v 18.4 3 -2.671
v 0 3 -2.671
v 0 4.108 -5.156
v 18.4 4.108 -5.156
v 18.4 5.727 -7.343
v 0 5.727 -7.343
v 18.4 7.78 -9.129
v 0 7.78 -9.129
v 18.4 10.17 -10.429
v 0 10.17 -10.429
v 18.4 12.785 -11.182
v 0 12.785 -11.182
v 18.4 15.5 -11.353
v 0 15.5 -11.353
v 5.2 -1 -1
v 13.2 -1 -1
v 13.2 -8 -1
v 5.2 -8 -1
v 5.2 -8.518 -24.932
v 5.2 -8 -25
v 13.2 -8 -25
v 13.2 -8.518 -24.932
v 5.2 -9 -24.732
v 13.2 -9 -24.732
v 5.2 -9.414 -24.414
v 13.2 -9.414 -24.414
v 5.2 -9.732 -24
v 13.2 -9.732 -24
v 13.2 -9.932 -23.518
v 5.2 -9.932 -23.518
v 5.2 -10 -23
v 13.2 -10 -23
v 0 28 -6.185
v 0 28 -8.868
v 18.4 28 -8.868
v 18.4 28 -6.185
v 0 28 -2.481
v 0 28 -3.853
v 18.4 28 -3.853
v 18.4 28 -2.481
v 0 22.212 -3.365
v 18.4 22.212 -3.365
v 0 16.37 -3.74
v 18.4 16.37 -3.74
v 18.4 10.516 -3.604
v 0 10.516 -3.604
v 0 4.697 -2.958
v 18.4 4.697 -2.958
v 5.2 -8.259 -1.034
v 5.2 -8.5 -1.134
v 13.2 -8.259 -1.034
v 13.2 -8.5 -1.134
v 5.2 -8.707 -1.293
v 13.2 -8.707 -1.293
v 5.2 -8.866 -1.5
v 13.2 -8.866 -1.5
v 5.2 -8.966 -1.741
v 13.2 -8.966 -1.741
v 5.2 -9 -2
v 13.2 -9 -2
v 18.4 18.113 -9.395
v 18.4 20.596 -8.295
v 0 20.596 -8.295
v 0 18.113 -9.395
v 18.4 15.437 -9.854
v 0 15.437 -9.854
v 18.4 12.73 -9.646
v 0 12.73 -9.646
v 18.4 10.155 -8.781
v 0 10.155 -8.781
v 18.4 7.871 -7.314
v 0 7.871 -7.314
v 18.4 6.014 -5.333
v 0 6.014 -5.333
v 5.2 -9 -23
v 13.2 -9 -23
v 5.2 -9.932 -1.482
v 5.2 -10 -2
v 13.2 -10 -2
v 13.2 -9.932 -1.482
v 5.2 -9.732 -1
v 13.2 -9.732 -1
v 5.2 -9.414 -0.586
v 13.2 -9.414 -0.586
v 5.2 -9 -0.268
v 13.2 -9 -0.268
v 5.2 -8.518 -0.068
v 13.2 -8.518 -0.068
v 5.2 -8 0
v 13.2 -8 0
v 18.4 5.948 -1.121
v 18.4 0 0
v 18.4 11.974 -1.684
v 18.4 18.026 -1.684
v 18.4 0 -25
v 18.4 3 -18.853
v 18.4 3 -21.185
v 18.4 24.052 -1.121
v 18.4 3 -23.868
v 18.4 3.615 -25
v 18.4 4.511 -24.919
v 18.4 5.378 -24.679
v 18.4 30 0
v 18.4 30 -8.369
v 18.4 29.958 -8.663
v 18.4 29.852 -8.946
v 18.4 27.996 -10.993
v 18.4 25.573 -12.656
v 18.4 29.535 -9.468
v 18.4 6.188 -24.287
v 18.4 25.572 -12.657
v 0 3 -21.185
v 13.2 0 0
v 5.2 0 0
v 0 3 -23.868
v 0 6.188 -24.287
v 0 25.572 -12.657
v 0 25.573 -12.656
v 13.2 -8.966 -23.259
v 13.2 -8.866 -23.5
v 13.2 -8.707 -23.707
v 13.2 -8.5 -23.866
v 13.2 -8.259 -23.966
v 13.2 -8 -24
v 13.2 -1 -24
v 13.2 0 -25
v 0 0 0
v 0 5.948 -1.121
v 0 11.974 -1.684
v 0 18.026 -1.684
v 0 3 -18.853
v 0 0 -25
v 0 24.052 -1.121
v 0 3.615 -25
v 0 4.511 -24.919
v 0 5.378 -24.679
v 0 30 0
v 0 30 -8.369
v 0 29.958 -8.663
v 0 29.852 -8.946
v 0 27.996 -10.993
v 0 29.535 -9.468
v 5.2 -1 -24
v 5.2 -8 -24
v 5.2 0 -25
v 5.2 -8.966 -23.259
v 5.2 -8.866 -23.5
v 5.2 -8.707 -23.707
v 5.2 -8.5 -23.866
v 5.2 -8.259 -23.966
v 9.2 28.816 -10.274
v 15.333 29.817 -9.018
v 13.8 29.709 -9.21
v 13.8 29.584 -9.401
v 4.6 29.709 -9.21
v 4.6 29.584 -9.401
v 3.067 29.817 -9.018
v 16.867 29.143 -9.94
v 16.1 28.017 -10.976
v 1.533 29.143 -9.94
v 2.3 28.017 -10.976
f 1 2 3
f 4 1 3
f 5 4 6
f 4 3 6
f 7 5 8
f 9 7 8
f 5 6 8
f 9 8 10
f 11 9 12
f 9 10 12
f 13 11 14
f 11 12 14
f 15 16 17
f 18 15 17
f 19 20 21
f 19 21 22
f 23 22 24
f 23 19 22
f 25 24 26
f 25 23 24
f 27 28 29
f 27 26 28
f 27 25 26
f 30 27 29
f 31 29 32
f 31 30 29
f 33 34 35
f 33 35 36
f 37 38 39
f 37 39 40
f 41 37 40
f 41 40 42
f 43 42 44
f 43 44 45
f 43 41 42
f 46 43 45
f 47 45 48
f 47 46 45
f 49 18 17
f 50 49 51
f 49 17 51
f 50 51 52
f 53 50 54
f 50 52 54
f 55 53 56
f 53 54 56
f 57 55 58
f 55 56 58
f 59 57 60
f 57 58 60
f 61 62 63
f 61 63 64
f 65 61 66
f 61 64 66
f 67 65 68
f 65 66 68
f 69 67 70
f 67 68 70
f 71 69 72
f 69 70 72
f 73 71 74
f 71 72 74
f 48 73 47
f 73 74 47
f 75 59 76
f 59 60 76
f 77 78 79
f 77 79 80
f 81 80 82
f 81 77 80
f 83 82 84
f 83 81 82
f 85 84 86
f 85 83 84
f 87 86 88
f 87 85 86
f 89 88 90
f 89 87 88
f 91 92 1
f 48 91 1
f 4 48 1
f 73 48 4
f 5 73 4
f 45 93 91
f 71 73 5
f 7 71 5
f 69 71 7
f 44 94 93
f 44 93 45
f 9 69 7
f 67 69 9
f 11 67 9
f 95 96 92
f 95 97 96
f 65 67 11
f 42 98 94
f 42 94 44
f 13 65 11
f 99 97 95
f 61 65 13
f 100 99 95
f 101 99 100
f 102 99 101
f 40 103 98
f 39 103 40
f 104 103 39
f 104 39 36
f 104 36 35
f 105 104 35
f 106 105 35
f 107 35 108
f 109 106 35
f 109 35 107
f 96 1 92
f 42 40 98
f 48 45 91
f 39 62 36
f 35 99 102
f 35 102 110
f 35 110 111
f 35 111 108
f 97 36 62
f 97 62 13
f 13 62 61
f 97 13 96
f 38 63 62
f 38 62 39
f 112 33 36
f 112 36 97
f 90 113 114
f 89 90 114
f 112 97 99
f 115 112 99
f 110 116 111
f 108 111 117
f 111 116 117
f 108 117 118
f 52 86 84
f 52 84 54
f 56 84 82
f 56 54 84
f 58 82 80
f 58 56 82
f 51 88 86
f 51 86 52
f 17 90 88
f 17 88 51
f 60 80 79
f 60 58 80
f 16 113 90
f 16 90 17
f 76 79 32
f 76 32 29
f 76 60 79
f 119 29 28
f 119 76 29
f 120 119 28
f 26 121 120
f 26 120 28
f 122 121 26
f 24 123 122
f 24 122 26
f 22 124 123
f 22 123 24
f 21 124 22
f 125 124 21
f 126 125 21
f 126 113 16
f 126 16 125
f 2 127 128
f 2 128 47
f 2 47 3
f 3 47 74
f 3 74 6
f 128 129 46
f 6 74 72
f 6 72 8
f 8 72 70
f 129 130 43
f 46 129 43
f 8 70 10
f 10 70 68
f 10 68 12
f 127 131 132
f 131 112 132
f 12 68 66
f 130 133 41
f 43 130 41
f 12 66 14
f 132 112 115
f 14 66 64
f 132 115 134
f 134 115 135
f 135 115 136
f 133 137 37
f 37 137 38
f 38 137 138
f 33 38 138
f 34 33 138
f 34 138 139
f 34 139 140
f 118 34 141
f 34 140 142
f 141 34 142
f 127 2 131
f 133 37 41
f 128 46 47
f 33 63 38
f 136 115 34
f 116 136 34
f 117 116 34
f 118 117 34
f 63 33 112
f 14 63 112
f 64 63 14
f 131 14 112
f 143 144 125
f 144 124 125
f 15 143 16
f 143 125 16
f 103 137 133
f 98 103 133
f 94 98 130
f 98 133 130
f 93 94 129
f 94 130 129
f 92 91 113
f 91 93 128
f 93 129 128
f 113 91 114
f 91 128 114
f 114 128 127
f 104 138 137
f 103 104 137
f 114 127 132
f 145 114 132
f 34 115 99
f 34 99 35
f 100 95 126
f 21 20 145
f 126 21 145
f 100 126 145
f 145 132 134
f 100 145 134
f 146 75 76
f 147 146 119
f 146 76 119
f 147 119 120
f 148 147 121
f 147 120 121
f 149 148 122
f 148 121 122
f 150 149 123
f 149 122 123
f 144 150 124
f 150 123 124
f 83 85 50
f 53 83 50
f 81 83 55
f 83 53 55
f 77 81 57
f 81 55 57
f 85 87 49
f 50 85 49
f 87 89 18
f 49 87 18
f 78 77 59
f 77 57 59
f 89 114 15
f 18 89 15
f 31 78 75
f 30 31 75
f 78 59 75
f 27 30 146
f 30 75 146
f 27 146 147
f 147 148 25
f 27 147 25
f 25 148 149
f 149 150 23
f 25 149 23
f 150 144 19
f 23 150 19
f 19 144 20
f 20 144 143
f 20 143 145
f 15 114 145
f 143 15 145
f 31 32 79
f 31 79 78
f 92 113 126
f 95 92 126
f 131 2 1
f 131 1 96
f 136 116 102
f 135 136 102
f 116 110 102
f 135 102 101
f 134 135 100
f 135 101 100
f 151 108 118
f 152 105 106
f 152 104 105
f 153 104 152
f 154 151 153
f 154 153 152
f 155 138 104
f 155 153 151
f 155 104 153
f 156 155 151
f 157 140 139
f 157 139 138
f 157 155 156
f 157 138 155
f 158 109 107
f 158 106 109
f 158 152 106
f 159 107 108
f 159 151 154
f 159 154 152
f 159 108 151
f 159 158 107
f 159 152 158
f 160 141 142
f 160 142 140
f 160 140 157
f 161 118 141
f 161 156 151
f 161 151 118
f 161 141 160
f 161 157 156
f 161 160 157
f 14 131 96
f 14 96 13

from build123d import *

# Parameters (mm, degrees)
BOSS_EXTRUDE1_DEPTH = 18.4
FILLET2_R           = 5
SKETCH2_W           = 12
SKETCH2_H           = 25
BOSS_EXTRUDE2_DEPTH = 10
SKETCH3_R           = 2.2
CUT_EXTRUDE1_DEPTH  = 42.905131118
FILLET3_R           = 2
SKETCH4_R           = 2.2
CUT_EXTRUDE2_DEPTH  = 2
CUT_EXTRUDE3_START  = -6
CUT_EXTRUDE3_DEPTH  = 4


with BuildPart() as part:
    # Sketch1 → Boss-Extrude1 (new body)
    # profile 1 of 2: a face of its own
    with BuildSketch(Plane(origin=(0, 0, 0), x_dir=(0, 0, -1), z_dir=(1, 0, 0))):
        with BuildLine():
            Line((10, 30), (0, 30))
            ThreePointArc((0, 30), (1.754446797, 15), (0, 0))
            Line((0, 0), (25, 0))
            Line((25, 0), (25, 5))
            Line((25, 5), (10, 30))
        make_face()
        with BuildLine():
            ThreePointArc((2.481153697, 28), (3.752513812, 15.508936318), (2.671060787, 3))
            Line((2.671060787, 3), (18.853000612, 3))
            Line((18.853000612, 3), (3.853000612, 28))
            Line((3.853000612, 28), (2.481153697, 28))
        make_face(mode=Mode.SUBTRACT)
        Polygon((21.18538137, 3), (23.867619242, 3), (8.867619242, 28), (6.18538137, 28), align=None, mode=Mode.SUBTRACT)
    # profile 2 of 2: a face of its own
    with BuildSketch(Plane(origin=(0, 0, 0), x_dir=(0, 0, -1), z_dir=(1, 0, 0))):
        with BuildLine():
            Line((11.353000612, 15.5), (8.295219913, 20.596301166))
            ThreePointArc((8.295219913, 20.596301166), (9.29299781, 11.415857711), (2.957581264, 4.69733109))
            ThreePointArc((2.957581264, 4.69733109), (2.819772168, 3.847745357), (2.671060787, 3))
            ThreePointArc((2.671060787, 3), (9.128517918, 7.779982826), (11.353000612, 15.5))
        make_face()
    extrude(amount=BOSS_EXTRUDE1_DEPTH)

    # Fillet1
    # an asymmetric fillet: 7, 5 mm, written as the material it takes off along each edge
    with BuildSketch(Plane(origin=(-12.908331632, 30, -10), x_dir=(0, 0, 1), z_dir=(1, 0, 0))) as fillet1_piece_1:
        with BuildLine():
            Bezier((1.630951895, 0), (0, 0), (-2.656512734, 4.427521223), weights=[1, 0.870199907, 1])
            Line((-2.656512734, 4.427521223), (0, 0))
            Line((0, 0), (1.630951895, 0))
        make_face()
    extrude(amount=44.216663264, mode=Mode.SUBTRACT)

    # Fillet2
    fillet2_edges = [part.edges().sort_by_distance(p)[0] for p in [
        (9.2, 5, -25),
    ]]
    fillet(fillet2_edges, radius=FILLET2_R)

    # Sketch2 → Boss-Extrude2 (add)
    with BuildSketch(Plane(origin=(0, 0, 0), x_dir=(-1, 0, 0), z_dir=(0, -1, 0))):
        with Locations((-9.2, 12.5)):
            Rectangle(SKETCH2_W, SKETCH2_H)
    extrude(amount=BOSS_EXTRUDE2_DEPTH)

    # Sketch3 → Cut-Extrude1 (cut, through all)
    with BuildSketch(Plane(origin=(15.2, 0, 0), x_dir=(0, 0, -1), z_dir=(1, 0, 0))):
        with Locations((5, -6)):
            Circle(SKETCH3_R)
        with Locations((20, -6)):
            Circle(SKETCH3_R)
    extrude(amount=-CUT_EXTRUDE1_DEPTH, mode=Mode.SUBTRACT)

    # Fillet3
    fillet3_edges = [part.edges().sort_by_distance(p)[0] for p in [
        (9.2, -10, -25),
        (9.2, -10, 0),
    ]]
    fillet(fillet3_edges, radius=FILLET3_R)

    # Sketch4 → Cut-Extrude2 (cut)
    # profile 1 of 2: a face of its own
    with BuildSketch(Plane(origin=(15.2, 0, 0), x_dir=(0, 0, -1), z_dir=(1, 0, 0))):
        with BuildLine():
            Line((25, 0), (0, 0))
            Line((0, 0), (0, -8))
            ThreePointArc((0, -8), (0.585786438, -9.414213562), (2, -10))
            Line((2, -10), (23, -10))
            ThreePointArc((23, -10), (24.414213562, -9.414213562), (25, -8))
            Line((25, -8), (25, 0))
        make_face()
        with BuildLine():
            ThreePointArc((23, -9), (23.707106781, -8.707106781), (24, -8))
            Line((24, -8), (24, -1))
            Line((24, -1), (1, -1))
            Line((1, -1), (1, -8))
            ThreePointArc((1, -8), (1.292893219, -8.707106781), (2, -9))
            Line((2, -9), (23, -9))
        make_face(mode=Mode.SUBTRACT)
    # profile 2 of 2: a face of its own
    with BuildSketch(Plane(origin=(15.2, 0, 0), x_dir=(0, 0, -1), z_dir=(1, 0, 0))):
        with BuildLine():
            Line((2, -9), (23, -9))
            ThreePointArc((23, -9), (23.707106781, -8.707106781), (24, -8))
            Line((24, -8), (24, -1))
            Line((24, -1), (1, -1))
            Line((1, -1), (1, -8))
            ThreePointArc((1, -8), (1.292893219, -8.707106781), (2, -9))
        make_face()
        with Locations((5, -6)):
            Circle(SKETCH4_R, mode=Mode.SUBTRACT)
        with Locations((20, -6)):
            Circle(SKETCH4_R, mode=Mode.SUBTRACT)
    cut_extrude2 = extrude(amount=-CUT_EXTRUDE2_DEPTH, mode=Mode.SUBTRACT)

    # Sketch4<3> → Cut-Extrude3 (cut)
    with BuildSketch(Plane(origin=(15.2, 0, 0), x_dir=(0, 0, -1), z_dir=(1, 0, 0)).offset(CUT_EXTRUDE3_START)):
        with BuildLine():
            Line((1, -1), (1, -8))
            ThreePointArc((1, -8), (1.292893219, -8.707106781), (2, -9))
            Line((2, -9), (23, -9))
            ThreePointArc((23, -9), (23.707106781, -8.707106781), (24, -8))
            Line((24, -8), (24, -1))
            Line((24, -1), (1, -1))
        make_face()
    cut_extrude3 = extrude(amount=CUT_EXTRUDE3_DEPTH, mode=Mode.SUBTRACT)

    # Mirror1: Cut-Extrude2, Cut-Extrude3 across plane
    add(cut_extrude2.mirror(Plane(origin=(9.2, 0, 0), x_dir=(0, 0, 1), z_dir=(1, 0, 0))), mode=Mode.SUBTRACT)
    add(cut_extrude3.mirror(Plane(origin=(9.2, 0, 0), x_dir=(0, 0, 1), z_dir=(1, 0, 0))), mode=Mode.SUBTRACT)


solid = part.part
